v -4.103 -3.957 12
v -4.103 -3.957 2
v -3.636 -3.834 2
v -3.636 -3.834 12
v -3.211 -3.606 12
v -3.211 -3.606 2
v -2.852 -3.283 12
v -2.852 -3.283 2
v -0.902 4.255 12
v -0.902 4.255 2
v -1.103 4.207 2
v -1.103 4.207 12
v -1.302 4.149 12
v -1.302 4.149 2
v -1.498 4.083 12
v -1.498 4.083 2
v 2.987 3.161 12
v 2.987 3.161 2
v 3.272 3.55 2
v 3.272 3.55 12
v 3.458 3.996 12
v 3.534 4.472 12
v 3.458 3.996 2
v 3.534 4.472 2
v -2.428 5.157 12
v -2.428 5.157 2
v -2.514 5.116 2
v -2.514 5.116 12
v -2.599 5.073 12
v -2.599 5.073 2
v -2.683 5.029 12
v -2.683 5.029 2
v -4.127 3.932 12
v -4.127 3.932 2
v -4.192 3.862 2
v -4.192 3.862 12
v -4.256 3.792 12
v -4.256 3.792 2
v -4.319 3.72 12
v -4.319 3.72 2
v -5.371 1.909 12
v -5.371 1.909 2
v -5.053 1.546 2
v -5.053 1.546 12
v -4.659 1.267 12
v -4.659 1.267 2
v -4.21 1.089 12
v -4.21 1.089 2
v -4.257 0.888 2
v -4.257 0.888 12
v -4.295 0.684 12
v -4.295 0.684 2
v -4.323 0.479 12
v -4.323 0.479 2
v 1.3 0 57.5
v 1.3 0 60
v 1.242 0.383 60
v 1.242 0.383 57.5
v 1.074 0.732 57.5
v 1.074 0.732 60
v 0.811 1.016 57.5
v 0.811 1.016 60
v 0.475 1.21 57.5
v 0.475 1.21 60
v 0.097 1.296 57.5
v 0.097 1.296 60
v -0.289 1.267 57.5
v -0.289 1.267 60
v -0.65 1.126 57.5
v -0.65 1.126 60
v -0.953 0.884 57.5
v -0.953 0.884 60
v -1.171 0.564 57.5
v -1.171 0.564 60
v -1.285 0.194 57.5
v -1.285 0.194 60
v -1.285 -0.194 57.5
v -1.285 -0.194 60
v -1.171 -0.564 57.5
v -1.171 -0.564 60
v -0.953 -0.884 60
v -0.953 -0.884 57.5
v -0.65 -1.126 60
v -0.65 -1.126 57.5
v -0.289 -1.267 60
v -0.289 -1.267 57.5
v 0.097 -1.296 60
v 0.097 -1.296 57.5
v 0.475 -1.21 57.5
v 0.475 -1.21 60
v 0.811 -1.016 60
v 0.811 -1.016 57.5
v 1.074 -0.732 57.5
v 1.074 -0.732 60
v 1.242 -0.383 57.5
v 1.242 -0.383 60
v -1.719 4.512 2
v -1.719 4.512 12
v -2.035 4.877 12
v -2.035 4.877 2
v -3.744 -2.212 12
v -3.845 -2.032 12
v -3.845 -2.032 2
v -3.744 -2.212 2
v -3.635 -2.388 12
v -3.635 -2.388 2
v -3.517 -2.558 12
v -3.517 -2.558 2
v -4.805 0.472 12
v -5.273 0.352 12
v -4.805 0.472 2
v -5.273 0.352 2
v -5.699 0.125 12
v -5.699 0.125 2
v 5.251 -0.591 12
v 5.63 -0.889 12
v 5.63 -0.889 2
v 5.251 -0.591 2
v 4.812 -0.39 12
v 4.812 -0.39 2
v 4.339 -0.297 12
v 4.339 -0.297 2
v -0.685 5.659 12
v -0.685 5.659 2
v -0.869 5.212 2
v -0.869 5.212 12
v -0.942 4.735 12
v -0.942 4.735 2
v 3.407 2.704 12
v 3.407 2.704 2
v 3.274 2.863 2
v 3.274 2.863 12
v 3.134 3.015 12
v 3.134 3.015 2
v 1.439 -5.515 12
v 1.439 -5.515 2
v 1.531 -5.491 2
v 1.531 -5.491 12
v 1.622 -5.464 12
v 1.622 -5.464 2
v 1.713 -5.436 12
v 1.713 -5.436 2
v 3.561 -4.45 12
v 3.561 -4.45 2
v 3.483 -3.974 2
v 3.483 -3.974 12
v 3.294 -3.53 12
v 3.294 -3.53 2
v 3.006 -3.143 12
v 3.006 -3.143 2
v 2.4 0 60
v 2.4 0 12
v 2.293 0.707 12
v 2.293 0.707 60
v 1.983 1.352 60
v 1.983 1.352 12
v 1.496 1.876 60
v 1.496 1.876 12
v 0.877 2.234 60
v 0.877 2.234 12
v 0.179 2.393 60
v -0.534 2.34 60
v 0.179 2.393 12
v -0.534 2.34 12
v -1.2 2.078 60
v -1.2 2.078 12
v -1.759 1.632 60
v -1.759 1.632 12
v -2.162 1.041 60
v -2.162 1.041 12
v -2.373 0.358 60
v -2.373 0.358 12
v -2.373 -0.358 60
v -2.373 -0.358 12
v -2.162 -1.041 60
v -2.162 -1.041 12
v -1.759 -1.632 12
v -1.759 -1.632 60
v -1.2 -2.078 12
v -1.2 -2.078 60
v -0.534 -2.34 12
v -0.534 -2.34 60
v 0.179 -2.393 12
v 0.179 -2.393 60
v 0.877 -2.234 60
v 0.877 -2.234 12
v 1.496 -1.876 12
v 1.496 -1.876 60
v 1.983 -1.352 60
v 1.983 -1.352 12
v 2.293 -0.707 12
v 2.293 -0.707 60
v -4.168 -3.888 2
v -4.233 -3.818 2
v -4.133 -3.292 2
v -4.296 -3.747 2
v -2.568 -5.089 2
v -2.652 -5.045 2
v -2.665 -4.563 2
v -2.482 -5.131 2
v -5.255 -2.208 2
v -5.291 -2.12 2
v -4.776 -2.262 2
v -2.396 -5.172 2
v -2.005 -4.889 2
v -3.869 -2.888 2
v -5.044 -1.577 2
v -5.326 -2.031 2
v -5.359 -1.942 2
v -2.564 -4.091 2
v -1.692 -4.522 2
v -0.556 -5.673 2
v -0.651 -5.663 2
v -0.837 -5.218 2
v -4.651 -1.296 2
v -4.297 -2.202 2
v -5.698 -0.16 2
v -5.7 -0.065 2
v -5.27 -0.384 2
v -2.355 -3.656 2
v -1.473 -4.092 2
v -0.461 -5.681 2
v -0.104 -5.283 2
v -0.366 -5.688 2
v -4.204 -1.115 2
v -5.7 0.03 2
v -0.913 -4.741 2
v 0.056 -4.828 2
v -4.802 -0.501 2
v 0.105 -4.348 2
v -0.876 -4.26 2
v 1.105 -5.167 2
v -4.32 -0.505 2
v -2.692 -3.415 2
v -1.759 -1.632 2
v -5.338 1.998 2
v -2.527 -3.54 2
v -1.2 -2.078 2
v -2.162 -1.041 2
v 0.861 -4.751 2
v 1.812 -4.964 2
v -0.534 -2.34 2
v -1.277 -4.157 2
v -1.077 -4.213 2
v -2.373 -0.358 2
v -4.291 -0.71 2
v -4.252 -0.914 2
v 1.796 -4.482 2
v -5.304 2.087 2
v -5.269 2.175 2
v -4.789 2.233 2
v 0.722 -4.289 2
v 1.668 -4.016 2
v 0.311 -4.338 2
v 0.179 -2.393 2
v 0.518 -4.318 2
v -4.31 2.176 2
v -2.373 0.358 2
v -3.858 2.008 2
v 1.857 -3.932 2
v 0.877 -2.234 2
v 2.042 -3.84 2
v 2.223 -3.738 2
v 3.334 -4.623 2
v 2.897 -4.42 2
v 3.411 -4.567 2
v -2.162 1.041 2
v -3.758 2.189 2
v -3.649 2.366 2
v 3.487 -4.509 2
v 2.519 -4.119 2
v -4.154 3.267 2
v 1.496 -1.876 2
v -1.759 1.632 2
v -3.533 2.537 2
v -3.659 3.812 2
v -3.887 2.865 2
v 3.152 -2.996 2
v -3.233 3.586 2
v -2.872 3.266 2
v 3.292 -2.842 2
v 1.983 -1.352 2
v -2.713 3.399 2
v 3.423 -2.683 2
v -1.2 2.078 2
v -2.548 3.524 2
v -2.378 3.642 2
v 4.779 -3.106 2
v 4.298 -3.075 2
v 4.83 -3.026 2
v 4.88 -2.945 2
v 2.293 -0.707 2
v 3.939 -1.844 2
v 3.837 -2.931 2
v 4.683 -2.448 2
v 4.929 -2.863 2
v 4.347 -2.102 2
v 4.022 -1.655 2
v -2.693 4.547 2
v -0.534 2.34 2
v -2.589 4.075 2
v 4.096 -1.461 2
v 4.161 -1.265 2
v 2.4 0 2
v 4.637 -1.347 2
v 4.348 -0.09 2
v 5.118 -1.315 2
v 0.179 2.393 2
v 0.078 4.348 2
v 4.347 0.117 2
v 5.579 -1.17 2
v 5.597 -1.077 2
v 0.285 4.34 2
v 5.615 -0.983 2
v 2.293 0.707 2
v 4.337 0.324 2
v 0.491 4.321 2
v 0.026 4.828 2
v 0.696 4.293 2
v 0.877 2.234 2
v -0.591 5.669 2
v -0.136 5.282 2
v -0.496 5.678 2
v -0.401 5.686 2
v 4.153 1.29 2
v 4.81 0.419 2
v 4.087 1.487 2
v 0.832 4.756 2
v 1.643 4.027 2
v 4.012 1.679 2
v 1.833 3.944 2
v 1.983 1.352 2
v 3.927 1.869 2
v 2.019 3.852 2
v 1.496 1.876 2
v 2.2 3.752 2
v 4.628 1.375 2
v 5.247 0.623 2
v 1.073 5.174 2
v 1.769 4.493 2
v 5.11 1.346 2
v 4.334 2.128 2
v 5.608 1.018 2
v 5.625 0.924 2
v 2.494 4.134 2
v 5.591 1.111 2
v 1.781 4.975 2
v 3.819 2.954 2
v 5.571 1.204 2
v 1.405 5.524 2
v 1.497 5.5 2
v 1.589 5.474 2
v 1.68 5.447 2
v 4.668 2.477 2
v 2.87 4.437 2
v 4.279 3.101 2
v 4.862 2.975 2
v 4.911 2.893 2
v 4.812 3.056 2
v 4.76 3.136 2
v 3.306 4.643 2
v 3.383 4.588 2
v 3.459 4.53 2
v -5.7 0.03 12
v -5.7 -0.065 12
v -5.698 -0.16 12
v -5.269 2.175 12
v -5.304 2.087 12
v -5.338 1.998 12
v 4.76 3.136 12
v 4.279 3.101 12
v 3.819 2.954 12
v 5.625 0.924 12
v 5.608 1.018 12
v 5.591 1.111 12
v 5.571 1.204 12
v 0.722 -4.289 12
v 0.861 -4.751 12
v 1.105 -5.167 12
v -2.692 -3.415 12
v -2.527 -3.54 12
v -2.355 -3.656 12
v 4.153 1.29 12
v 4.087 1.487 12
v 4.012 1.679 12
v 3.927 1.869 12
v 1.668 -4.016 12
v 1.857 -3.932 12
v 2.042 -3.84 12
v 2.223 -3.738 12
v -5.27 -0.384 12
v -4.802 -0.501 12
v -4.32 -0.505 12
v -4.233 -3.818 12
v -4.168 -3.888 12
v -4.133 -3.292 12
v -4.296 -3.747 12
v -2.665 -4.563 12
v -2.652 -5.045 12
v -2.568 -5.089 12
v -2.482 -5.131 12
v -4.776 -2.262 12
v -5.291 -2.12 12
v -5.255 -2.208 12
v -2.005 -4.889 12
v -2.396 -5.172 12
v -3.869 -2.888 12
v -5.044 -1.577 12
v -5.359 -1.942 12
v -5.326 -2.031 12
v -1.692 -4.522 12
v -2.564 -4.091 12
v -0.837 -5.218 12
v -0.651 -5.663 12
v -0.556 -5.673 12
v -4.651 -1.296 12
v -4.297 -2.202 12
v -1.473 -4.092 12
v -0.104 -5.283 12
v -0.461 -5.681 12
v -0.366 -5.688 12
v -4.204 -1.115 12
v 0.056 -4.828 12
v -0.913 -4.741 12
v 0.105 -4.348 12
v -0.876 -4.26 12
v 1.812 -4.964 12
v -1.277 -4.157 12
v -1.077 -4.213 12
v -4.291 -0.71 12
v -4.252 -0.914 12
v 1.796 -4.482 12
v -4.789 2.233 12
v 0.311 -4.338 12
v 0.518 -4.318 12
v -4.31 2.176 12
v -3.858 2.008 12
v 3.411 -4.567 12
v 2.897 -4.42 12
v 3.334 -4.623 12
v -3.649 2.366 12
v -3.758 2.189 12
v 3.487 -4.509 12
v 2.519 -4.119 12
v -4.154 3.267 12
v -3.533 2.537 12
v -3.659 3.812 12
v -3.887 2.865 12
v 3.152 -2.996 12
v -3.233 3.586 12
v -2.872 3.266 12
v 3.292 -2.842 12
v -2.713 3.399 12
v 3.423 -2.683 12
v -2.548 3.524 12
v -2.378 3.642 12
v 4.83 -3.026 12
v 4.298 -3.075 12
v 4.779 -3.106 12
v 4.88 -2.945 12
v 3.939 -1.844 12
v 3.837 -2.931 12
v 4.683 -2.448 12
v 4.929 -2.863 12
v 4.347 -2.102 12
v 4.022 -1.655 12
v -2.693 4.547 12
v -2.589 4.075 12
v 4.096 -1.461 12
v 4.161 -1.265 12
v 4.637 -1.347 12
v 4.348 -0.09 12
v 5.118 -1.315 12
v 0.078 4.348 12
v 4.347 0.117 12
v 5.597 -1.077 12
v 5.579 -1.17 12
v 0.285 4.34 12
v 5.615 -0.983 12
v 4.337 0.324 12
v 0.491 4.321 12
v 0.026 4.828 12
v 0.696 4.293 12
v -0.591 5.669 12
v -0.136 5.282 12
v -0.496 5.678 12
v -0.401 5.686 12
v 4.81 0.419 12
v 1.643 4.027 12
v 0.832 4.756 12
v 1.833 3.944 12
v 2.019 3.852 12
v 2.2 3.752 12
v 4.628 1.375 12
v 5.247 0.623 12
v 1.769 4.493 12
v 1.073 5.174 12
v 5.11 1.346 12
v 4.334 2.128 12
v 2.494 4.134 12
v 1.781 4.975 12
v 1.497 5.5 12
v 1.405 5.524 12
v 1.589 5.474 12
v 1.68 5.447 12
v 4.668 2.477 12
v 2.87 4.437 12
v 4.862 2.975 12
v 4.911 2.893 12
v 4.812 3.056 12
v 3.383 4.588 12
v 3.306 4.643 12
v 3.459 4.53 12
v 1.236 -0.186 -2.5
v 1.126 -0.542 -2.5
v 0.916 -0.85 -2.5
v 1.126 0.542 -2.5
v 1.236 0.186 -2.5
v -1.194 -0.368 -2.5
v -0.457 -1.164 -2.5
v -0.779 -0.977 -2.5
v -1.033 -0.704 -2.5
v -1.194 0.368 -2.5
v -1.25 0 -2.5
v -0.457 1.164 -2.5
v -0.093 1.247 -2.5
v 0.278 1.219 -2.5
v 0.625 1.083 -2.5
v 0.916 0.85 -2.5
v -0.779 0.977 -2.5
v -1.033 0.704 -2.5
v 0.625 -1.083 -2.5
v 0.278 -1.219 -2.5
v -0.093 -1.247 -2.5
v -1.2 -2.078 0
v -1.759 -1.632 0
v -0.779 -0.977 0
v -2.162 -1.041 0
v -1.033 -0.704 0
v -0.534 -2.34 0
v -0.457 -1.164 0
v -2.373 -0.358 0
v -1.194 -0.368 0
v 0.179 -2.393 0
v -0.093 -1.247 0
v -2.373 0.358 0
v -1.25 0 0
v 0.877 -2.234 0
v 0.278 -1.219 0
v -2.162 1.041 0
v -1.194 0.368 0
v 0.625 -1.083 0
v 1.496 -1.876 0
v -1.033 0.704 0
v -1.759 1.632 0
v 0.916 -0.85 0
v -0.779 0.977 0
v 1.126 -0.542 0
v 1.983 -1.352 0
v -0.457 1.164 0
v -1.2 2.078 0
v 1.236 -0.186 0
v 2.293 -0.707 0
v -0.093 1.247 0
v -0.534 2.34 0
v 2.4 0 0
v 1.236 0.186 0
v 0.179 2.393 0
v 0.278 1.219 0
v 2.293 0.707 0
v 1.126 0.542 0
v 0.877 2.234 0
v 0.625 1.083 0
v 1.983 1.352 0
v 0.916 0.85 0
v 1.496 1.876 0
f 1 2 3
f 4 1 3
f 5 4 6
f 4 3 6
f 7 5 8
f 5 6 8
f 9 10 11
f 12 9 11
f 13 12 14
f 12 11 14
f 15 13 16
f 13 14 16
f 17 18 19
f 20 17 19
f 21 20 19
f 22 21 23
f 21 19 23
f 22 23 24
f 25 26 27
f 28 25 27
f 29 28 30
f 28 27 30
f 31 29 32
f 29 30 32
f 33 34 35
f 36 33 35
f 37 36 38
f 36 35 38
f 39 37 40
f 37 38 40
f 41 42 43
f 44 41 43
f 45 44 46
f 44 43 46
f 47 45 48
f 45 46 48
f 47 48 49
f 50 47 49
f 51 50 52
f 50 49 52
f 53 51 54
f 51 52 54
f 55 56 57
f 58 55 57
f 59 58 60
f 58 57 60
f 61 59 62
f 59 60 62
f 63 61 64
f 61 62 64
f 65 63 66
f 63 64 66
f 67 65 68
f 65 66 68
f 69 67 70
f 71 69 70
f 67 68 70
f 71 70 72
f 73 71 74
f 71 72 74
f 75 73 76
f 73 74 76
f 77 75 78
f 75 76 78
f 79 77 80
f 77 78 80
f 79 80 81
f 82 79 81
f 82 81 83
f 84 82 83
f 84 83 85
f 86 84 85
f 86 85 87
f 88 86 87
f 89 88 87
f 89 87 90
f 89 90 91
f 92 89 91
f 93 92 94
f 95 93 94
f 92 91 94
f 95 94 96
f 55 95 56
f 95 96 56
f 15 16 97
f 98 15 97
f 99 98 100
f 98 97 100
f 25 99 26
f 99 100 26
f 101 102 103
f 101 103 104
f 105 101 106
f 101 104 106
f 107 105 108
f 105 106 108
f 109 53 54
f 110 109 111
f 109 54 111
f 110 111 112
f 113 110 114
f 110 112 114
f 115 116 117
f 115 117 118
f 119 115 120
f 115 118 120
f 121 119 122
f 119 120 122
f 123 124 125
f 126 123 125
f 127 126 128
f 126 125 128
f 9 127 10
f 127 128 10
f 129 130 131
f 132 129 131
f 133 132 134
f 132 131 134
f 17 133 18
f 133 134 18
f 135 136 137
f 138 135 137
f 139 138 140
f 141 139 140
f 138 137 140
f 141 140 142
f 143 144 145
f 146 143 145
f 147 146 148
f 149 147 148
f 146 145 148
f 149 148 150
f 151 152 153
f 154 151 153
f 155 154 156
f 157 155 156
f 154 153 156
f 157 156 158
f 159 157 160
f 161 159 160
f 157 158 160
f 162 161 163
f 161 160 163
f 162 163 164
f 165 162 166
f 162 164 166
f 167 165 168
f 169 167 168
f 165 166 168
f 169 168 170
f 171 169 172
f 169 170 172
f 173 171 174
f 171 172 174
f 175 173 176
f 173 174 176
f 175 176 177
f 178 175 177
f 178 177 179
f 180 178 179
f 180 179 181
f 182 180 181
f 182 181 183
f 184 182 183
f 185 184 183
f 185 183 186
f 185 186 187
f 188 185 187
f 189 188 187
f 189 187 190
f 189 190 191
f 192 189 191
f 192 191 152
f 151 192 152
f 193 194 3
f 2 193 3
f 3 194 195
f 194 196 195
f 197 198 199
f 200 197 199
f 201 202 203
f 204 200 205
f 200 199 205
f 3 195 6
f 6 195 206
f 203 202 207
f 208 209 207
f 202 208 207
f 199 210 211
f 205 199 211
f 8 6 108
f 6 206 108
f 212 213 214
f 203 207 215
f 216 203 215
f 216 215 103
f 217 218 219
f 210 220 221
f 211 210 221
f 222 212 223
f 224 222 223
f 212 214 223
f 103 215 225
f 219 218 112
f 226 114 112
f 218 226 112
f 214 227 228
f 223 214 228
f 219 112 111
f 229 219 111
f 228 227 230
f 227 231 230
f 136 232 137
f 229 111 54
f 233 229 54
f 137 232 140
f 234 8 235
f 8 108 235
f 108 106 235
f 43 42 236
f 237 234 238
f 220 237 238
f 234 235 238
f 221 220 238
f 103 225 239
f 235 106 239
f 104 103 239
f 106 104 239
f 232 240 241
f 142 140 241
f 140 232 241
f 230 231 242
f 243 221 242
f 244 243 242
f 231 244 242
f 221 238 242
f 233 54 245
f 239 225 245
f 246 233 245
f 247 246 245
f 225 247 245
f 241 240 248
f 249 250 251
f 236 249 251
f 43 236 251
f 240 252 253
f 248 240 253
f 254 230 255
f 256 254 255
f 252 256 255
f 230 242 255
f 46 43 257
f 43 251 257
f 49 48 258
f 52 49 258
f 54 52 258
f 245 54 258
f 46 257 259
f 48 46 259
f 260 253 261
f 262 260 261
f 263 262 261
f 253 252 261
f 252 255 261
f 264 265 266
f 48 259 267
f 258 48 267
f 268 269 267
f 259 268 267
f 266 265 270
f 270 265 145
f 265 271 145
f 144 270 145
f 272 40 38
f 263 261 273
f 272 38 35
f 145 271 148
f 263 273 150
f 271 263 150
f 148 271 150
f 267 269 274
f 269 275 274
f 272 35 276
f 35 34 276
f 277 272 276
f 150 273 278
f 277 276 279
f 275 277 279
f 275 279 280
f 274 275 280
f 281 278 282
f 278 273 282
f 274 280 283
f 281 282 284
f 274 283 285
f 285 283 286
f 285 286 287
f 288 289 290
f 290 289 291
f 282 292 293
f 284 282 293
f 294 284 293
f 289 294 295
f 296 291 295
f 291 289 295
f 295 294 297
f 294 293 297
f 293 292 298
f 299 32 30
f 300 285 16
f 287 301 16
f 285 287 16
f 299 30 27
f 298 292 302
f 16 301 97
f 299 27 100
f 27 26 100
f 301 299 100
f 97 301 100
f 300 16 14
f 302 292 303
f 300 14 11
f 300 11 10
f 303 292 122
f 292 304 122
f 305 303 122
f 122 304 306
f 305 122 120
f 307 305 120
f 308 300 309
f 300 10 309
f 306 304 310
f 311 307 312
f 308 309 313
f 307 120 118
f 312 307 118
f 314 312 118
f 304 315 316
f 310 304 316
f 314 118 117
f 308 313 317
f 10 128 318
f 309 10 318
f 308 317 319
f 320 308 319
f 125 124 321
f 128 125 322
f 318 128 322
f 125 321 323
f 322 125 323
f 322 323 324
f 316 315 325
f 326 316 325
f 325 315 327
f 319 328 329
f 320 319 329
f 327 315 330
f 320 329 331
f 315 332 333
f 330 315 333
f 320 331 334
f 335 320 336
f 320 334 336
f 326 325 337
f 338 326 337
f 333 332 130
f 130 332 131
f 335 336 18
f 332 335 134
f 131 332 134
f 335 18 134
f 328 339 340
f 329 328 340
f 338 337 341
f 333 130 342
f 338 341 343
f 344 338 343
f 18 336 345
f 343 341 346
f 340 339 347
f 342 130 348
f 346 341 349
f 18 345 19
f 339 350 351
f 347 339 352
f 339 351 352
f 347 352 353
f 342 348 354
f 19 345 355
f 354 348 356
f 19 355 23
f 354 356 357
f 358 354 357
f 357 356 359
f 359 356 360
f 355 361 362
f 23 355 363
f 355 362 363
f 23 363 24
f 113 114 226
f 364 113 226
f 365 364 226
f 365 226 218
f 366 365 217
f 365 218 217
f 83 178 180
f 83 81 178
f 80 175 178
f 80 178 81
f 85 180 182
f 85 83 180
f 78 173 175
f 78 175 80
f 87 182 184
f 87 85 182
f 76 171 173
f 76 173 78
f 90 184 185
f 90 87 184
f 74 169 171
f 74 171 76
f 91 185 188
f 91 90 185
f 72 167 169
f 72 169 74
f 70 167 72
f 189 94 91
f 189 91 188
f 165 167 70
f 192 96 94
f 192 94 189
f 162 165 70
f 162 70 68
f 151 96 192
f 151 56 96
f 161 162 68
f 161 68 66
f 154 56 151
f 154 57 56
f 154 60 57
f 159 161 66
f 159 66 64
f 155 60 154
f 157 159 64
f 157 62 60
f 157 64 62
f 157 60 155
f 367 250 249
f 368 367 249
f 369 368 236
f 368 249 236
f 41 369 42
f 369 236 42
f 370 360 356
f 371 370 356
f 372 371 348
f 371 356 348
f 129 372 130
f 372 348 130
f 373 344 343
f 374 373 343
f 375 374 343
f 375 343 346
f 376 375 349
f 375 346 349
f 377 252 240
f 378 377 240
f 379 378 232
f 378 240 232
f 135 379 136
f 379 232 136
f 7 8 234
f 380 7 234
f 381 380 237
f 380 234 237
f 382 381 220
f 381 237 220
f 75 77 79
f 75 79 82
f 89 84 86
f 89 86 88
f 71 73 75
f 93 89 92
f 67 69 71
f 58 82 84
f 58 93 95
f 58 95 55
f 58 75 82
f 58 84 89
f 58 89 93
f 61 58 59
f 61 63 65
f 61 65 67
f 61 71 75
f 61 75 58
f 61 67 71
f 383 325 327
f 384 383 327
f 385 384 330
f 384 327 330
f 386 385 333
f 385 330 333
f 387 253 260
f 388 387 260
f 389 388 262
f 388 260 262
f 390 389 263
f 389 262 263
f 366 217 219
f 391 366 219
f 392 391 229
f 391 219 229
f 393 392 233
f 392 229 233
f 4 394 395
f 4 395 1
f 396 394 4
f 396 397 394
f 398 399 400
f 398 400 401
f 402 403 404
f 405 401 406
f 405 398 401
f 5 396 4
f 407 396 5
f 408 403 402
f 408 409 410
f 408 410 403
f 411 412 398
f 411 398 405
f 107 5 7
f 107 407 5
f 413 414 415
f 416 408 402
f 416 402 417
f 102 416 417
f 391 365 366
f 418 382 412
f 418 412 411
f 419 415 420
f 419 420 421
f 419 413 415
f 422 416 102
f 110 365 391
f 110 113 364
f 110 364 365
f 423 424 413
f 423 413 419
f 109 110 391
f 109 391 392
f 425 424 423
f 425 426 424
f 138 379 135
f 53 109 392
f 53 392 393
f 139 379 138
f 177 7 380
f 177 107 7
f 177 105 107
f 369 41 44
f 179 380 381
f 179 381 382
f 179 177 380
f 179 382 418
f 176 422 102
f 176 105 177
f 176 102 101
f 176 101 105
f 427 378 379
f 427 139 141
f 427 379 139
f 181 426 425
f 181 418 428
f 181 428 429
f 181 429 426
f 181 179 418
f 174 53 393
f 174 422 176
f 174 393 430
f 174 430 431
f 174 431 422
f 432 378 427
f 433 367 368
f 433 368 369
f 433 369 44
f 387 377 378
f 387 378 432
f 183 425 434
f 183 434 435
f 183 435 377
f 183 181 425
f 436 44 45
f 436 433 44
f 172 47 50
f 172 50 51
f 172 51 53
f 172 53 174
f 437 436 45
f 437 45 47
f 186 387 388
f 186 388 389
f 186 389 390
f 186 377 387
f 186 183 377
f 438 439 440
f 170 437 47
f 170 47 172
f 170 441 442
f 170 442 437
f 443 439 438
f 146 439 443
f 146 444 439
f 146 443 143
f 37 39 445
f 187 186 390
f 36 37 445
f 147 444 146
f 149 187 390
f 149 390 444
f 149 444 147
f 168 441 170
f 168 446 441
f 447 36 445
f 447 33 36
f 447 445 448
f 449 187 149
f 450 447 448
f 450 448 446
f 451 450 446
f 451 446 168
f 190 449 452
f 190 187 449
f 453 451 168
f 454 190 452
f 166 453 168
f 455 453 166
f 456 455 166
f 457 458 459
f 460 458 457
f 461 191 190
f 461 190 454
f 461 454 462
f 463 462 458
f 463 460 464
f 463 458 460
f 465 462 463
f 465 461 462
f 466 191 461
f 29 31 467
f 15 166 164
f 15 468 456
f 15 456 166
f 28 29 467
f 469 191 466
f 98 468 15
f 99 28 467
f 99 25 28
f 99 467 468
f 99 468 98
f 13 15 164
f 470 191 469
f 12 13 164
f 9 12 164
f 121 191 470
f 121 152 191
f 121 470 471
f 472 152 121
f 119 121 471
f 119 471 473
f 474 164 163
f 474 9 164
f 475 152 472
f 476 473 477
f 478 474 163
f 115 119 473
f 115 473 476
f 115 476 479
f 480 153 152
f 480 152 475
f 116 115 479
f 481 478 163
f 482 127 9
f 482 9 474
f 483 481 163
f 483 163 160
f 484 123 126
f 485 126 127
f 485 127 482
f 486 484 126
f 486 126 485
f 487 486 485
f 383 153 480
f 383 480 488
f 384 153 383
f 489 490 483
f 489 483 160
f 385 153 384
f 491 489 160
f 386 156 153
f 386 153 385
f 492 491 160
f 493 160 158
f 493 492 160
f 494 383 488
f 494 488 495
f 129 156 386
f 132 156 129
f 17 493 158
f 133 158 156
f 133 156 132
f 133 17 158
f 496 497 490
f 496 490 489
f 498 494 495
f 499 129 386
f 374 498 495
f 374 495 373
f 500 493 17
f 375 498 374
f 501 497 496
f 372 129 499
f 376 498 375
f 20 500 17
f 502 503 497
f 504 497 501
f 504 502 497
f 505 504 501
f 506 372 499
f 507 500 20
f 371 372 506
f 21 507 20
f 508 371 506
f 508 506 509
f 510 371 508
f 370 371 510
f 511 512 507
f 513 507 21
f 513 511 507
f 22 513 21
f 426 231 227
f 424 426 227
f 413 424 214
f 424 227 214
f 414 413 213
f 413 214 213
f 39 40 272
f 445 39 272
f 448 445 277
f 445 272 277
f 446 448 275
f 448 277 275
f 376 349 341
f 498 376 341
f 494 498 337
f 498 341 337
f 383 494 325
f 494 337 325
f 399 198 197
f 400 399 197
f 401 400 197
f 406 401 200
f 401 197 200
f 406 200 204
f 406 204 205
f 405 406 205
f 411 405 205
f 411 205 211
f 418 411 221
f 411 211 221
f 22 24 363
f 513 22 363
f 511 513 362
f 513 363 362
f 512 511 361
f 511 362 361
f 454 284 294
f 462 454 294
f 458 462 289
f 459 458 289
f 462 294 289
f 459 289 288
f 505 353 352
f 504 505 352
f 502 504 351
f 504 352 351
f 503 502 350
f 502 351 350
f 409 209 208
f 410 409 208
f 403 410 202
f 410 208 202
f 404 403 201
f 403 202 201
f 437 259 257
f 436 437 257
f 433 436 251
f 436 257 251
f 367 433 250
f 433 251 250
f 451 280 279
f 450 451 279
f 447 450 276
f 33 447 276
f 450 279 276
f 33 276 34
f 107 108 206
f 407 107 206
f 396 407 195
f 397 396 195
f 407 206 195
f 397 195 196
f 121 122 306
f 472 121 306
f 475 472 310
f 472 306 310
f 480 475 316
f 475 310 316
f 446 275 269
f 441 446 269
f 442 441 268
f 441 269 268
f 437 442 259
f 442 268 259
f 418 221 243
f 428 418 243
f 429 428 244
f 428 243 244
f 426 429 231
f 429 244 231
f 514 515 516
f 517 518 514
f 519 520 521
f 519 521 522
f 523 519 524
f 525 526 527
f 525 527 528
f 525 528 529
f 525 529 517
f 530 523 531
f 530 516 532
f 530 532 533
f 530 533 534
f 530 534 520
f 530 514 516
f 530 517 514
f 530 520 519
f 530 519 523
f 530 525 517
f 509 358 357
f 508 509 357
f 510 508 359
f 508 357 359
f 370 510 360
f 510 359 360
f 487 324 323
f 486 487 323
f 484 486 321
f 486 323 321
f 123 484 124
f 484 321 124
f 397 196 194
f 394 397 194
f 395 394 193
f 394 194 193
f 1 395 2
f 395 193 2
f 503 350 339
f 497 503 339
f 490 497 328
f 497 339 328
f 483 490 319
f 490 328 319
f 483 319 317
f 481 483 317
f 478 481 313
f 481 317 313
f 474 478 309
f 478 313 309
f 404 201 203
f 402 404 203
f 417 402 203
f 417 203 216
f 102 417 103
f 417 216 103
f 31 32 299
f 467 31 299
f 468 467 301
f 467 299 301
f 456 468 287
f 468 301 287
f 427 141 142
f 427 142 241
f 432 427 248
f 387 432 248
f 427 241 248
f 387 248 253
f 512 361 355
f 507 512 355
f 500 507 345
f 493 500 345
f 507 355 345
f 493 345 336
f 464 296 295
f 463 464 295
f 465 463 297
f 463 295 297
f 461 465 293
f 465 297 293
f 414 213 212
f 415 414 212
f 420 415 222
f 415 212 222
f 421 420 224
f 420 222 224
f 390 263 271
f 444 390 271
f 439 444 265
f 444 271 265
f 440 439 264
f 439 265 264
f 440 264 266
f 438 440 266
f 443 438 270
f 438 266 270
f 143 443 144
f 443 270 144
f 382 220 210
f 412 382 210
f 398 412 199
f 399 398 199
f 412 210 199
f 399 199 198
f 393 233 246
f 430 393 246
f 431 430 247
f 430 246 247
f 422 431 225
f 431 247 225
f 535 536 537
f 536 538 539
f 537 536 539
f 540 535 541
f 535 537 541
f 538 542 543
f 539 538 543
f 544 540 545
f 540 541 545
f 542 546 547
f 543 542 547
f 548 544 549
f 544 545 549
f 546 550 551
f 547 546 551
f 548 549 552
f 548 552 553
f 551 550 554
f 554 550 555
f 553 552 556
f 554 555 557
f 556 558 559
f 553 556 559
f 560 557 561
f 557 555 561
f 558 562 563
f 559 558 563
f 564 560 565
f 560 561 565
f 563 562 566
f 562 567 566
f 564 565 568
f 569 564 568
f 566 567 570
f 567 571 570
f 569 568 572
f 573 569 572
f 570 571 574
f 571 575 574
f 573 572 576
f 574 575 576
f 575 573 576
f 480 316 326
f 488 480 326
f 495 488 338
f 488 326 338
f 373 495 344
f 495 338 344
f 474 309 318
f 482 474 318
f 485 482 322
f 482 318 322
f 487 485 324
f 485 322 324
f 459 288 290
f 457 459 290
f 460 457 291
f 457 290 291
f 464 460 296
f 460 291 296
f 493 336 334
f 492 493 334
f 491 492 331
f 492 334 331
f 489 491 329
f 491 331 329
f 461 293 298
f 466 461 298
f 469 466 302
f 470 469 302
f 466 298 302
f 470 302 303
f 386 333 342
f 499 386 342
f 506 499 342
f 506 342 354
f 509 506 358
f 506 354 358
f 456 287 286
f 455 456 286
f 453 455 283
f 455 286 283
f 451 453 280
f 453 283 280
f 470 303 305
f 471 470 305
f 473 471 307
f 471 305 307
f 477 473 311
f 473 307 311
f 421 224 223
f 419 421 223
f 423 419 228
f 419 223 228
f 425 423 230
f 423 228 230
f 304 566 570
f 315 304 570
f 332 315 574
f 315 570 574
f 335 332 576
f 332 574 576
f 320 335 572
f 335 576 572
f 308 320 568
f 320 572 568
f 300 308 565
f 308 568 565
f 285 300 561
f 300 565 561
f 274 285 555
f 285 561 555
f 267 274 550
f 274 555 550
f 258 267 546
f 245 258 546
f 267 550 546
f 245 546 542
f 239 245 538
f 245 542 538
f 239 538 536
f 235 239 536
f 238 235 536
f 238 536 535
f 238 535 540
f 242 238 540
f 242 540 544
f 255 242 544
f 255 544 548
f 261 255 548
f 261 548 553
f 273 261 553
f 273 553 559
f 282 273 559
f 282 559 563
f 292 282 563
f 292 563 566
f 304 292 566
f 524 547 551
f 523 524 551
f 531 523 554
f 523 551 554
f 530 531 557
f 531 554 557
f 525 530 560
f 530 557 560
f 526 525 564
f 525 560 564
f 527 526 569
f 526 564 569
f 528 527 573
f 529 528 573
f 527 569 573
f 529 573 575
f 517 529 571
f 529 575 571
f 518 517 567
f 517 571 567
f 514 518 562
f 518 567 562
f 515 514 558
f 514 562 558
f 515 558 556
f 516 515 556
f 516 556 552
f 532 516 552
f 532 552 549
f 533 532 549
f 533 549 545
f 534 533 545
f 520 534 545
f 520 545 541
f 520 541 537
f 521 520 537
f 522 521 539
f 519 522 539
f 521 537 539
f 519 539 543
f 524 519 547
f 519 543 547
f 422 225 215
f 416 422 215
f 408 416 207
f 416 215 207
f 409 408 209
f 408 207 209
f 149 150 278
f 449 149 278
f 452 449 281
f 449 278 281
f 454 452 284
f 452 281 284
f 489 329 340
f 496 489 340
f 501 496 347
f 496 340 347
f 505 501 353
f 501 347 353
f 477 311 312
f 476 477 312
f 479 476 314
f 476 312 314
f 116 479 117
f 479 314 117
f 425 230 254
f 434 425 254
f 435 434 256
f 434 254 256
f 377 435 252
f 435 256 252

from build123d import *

# Parameters (mm, degrees)
SKETCH1_R           = 2.4
BOSS_EXTRUDE1_DEPTH = 60
SKETCH6_R           = 1.25
BOSS_EXTRUDE2_DEPTH = 2.5
SKETCH7_R           = 1.3
CUT_EXTRUDE1_DEPTH  = 2.5
JOIN2_START         = 2
JOIN2_OUTLINE_R     = 2.4
JOIN2_DEPTH         = 10


# Read off the part's stored shape, not the designer's step: Join2
with BuildPart() as part:
    # Sketch1 → Boss-Extrude1 (new body)
    with BuildSketch(Plane.XY):
        Circle(SKETCH1_R)
    extrude(amount=BOSS_EXTRUDE1_DEPTH)

    # Sketch6 → Boss-Extrude2 (add)
    with BuildSketch(Plane(origin=(0, 0, 0), x_dir=(-1, 0, 0), z_dir=(0, 0, -1))):
        Circle(SKETCH6_R)
    extrude(amount=BOSS_EXTRUDE2_DEPTH)

    # Sketch7 → Cut-Extrude1 (cut)
    with BuildSketch(Plane.XY.offset(60)):
        Circle(SKETCH7_R)
    extrude(amount=-CUT_EXTRUDE1_DEPTH, mode=Mode.SUBTRACT)

    # Join2 outline → Join2 (add)
    with BuildSketch(Plane.XY.offset(JOIN2_START)):
        with BuildLine():
            ThreePointArc((2.986969532, 3.160983077), (3.378378938, 3.767383023), (3.534131338, 4.472126528))
            ThreePointArc((3.534131338, 4.472126528), (3.42105158, 4.559211126), (3.305826871, 4.643437164))
            ThreePointArc((3.305826871, 4.643437164), (2.672723858, 4.296878666), (2.199922956, 3.751551677))
            ThreePointArc((2.199922956, 3.751551677), (1.926567958, 3.89899178), (1.643387346, 4.026546788))
            ThreePointArc((1.643387346, 4.026546788), (1.78930882, 4.733391284), (1.679960889, 5.446809287))
            ThreePointArc((1.679960889, 5.446809287), (1.54305857, 5.487164136), (1.405188775, 5.524078612))
            ThreePointArc((1.405188775, 5.524078612), (0.940029166, 4.972219249), (0.696150284, 4.29292159))
            ThreePointArc((0.696150284, 4.29292159), (0.387992831, 4.331658177), (0.077856591, 4.348303043))
            ThreePointArc((0.077856591, 4.348303043), (-0.04141737, 5.060128822), (-0.401097586, 5.68587027))
            ThreePointArc((-0.401097586, 5.68587027), (-0.54333305, 5.674045223), (-0.685227852, 5.658662633))
            ThreePointArc((-0.685227852, 5.658662633), (-0.919621674, 4.976034071), (-0.90164134, 4.254508655))
            ThreePointArc((-0.90164134, 4.254508655), (-1.202982876, 4.179310134), (-1.498189127, 4.082796877))
            ThreePointArc((-1.498189127, 4.082796877), (-1.866549914, 4.703467924), (-2.427985611, 5.157022966))
            ThreePointArc((-2.427985611, 5.157022966), (-2.556344531, 5.094615063), (-2.683100661, 5.02901291))
            ThreePointArc((-2.683100661, 5.02901291), (-2.655072511, 4.307807918), (-2.377661306, 3.64150075))
            ThreePointArc((-2.377661306, 3.64150075), (-2.631489081, 3.4625231), (-2.871896102, 3.26588637))
            ThreePointArc((-2.871896102, 3.26588637), (-3.439594549, 3.71157762), (-4.126960724, 3.931691135))
            ThreePointArc((-4.126960724, 3.931691135), (-4.224107518, 3.827128908), (-4.318605858, 3.720167126))
            ThreePointArc((-4.318605858, 3.720167126), (-4.031941094, 3.057788434), (-3.532564937, 2.536687991))
            ThreePointArc((-3.532564937, 2.536687991), (-3.704598104, 2.278103134), (-3.857737594, 2.007899811))
            ThreePointArc((-3.857737594, 2.007899811), (-4.548102881, 2.218418192), (-5.268566924, 2.17536263))
            ThreePointArc((-5.268566924, 2.17536263), (-5.321381378, 2.042767787), (-5.370859403, 1.908892158))
            ThreePointArc((-5.370859403, 1.908892158), (-4.864273689, 1.39479768), (-4.210376099, 1.089281462))
            ThreePointArc((-4.210376099, 1.089281462), (-4.277380625, 0.786012716), (-4.322570249, 0.478735257))
            ThreePointArc((-4.322570249, 0.478735257), (-5.042364718, 0.425649095), (-5.698623966, 0.125239347))
            ThreePointArc((-5.698623966, 0.125239347), (-5.699973196, -0.017480443), (-5.697748625, -0.160189273))
            ThreePointArc((-5.697748625, -0.160189273), (-5.039659169, -0.45656823), (-4.319552638, -0.505238564))
            ThreePointArc((-4.319552638, -0.505238564), (-4.272479191, -0.812233074), (-4.203615838, -1.115085146))
            ThreePointArc((-4.203615838, -1.115085146), (-4.855627257, -1.424606272), (-5.359050265, -1.941798203))
            ThreePointArc((-5.359050265, -1.941798203), (-5.308752049, -2.075367842), (-5.255125323, -2.207636255))
            ThreePointArc((-5.255125323, -2.207636255), (-4.534410753, -2.246272071), (-3.845349658, -2.031523322))
            ThreePointArc((-3.845349658, -2.031523322), (-3.690555767, -2.300782287), (-3.516939816, -2.558307122))
            ThreePointArc((-3.516939816, -2.558307122), (-4.013110431, -3.082460667), (-4.295707129, -3.746585146))
            ThreePointArc((-4.295707129, -3.746585146), (-4.200554521, -3.852965314), (-4.102768227, -3.956929729))
            ThreePointArc((-4.102768227, -3.956929729), (-3.416765039, -3.732604421), (-2.851810899, -3.283439599))
            ThreePointArc((-2.851810899, -3.283439599), (-2.610202337, -3.478598103), (-2.355281584, -3.656015544))
            ThreePointArc((-2.355281584, -3.656015544), (-2.628600803, -4.324011669), (-2.652204943, -5.045375005))
            ThreePointArc((-2.652204943, -5.045375005), (-2.52504883, -5.110198471), (-2.396309547, -5.171817916))
            ThreePointArc((-2.396309547, -5.171817916), (-1.837666272, -4.714827862), (-1.473119275, -4.091909163))
            ThreePointArc((-1.473119275, -4.091909163), (-1.177326617, -4.186609969), (-0.875529522, -4.259958809))
            ThreePointArc((-0.875529522, -4.259958809), (-0.889084071, -4.981580935), (-0.650507783, -5.662759012))
            ThreePointArc((-0.650507783, -5.662759012), (-0.508521301, -5.677271007), (-0.366215984, -5.688223436))
            ThreePointArc((-0.366215984, -5.688223436), (-0.010380493, -5.060287674), (0.104525269, -4.347743722))
            ThreePointArc((0.104525269, -4.347743722), (0.414553585, -4.329196961), (0.722467652, -4.288571031))
            ThreePointArc((0.722467652, -4.288571031), (0.970508391, -4.966360091), (1.439044058, -5.515356036))
            ThreePointArc((1.439044058, -5.515356036), (1.576684846, -5.477596635), (1.713337076, -5.436402861))
            ThreePointArc((1.713337076, -5.436402861), (1.818307229, -4.722327595), (1.668053097, -4.016391398))
            ThreePointArc((1.668053097, -4.016391398), (1.950446029, -3.887101914), (2.222891567, -3.737987972))
            ThreePointArc((2.222891567, -3.737987972), (2.699028318, -4.280404798), (3.334245025, -4.623073665))
            ThreePointArc((3.334245025, -4.623073665), (3.448950969, -4.538142485), (3.56149447, -4.450365955))
            ThreePointArc((3.56149447, -4.450365955), (3.401422484, -3.746591007), (3.006301111, -3.142603161))
            ThreePointArc((3.006301111, -3.142603161), (3.222919929, -2.920032214), (3.423101659, -2.682568924))
            ThreePointArc((3.423101659, -2.682568924), (4.063029514, -3.016357118), (4.779137726, -3.106419579))
            ThreePointArc((4.779137726, -3.106419579), (4.855417152, -2.985787046), (4.928652302, -2.863282467))
            ThreePointArc((4.928652302, -2.863282467), (4.525156785, -2.264856544), (3.938531501, -1.844388954))
            ThreePointArc((3.938531501, -1.844388954), (4.060120634, -1.558595984), (4.161002903, -1.264854079))
            ThreePointArc((4.161002903, -1.264854079), (4.87829606, -1.344933695), (5.578581394, -1.170226315))
            ThreePointArc((5.578581394, -1.170226315), (5.606132343, -1.030184521), (5.630168329, -0.889496816))
            ThreePointArc((5.630168329, -0.889496816), (5.037743587, -0.477240654), (4.338841388, -0.297079798))
            ThreePointArc((4.338841388, -0.297079798), (4.348979549, 0.013337271), (4.336937648, 0.323686319))
            ThreePointArc((4.336937648, 0.323686319), (5.034721691, 0.508130476), (5.624606733, 0.924012497))
            ThreePointArc((5.624606733, 0.924012497), (5.599708298, 1.064550132), (5.571298926, 1.204420309))
            ThreePointArc((5.571298926, 1.204420309), (4.869955203, 1.374829231), (4.153166704, 1.290351631))
            ThreePointArc((4.153166704, 1.290351631), (4.050484678, 1.583469253), (3.927144933, 1.868511086))
            ThreePointArc((3.927144933, 1.868511086), (4.511180261, 2.29256881), (4.910997766, 2.893458301))
            ThreePointArc((4.910997766, 2.893458301), (4.837012617, 3.01551139), (4.759994731, 3.135673797))
            ThreePointArc((4.759994731, 3.135673797), (4.044452383, 3.04122081), (3.406583842, 2.703513922))
            ThreePointArc((3.406583842, 2.703513922), (3.204949406, 2.939744939), (2.986969532, 3.160983077))
        make_face()
        Circle(JOIN2_OUTLINE_R, mode=Mode.SUBTRACT)
    extrude(amount=JOIN2_DEPTH)


solid = part.part
